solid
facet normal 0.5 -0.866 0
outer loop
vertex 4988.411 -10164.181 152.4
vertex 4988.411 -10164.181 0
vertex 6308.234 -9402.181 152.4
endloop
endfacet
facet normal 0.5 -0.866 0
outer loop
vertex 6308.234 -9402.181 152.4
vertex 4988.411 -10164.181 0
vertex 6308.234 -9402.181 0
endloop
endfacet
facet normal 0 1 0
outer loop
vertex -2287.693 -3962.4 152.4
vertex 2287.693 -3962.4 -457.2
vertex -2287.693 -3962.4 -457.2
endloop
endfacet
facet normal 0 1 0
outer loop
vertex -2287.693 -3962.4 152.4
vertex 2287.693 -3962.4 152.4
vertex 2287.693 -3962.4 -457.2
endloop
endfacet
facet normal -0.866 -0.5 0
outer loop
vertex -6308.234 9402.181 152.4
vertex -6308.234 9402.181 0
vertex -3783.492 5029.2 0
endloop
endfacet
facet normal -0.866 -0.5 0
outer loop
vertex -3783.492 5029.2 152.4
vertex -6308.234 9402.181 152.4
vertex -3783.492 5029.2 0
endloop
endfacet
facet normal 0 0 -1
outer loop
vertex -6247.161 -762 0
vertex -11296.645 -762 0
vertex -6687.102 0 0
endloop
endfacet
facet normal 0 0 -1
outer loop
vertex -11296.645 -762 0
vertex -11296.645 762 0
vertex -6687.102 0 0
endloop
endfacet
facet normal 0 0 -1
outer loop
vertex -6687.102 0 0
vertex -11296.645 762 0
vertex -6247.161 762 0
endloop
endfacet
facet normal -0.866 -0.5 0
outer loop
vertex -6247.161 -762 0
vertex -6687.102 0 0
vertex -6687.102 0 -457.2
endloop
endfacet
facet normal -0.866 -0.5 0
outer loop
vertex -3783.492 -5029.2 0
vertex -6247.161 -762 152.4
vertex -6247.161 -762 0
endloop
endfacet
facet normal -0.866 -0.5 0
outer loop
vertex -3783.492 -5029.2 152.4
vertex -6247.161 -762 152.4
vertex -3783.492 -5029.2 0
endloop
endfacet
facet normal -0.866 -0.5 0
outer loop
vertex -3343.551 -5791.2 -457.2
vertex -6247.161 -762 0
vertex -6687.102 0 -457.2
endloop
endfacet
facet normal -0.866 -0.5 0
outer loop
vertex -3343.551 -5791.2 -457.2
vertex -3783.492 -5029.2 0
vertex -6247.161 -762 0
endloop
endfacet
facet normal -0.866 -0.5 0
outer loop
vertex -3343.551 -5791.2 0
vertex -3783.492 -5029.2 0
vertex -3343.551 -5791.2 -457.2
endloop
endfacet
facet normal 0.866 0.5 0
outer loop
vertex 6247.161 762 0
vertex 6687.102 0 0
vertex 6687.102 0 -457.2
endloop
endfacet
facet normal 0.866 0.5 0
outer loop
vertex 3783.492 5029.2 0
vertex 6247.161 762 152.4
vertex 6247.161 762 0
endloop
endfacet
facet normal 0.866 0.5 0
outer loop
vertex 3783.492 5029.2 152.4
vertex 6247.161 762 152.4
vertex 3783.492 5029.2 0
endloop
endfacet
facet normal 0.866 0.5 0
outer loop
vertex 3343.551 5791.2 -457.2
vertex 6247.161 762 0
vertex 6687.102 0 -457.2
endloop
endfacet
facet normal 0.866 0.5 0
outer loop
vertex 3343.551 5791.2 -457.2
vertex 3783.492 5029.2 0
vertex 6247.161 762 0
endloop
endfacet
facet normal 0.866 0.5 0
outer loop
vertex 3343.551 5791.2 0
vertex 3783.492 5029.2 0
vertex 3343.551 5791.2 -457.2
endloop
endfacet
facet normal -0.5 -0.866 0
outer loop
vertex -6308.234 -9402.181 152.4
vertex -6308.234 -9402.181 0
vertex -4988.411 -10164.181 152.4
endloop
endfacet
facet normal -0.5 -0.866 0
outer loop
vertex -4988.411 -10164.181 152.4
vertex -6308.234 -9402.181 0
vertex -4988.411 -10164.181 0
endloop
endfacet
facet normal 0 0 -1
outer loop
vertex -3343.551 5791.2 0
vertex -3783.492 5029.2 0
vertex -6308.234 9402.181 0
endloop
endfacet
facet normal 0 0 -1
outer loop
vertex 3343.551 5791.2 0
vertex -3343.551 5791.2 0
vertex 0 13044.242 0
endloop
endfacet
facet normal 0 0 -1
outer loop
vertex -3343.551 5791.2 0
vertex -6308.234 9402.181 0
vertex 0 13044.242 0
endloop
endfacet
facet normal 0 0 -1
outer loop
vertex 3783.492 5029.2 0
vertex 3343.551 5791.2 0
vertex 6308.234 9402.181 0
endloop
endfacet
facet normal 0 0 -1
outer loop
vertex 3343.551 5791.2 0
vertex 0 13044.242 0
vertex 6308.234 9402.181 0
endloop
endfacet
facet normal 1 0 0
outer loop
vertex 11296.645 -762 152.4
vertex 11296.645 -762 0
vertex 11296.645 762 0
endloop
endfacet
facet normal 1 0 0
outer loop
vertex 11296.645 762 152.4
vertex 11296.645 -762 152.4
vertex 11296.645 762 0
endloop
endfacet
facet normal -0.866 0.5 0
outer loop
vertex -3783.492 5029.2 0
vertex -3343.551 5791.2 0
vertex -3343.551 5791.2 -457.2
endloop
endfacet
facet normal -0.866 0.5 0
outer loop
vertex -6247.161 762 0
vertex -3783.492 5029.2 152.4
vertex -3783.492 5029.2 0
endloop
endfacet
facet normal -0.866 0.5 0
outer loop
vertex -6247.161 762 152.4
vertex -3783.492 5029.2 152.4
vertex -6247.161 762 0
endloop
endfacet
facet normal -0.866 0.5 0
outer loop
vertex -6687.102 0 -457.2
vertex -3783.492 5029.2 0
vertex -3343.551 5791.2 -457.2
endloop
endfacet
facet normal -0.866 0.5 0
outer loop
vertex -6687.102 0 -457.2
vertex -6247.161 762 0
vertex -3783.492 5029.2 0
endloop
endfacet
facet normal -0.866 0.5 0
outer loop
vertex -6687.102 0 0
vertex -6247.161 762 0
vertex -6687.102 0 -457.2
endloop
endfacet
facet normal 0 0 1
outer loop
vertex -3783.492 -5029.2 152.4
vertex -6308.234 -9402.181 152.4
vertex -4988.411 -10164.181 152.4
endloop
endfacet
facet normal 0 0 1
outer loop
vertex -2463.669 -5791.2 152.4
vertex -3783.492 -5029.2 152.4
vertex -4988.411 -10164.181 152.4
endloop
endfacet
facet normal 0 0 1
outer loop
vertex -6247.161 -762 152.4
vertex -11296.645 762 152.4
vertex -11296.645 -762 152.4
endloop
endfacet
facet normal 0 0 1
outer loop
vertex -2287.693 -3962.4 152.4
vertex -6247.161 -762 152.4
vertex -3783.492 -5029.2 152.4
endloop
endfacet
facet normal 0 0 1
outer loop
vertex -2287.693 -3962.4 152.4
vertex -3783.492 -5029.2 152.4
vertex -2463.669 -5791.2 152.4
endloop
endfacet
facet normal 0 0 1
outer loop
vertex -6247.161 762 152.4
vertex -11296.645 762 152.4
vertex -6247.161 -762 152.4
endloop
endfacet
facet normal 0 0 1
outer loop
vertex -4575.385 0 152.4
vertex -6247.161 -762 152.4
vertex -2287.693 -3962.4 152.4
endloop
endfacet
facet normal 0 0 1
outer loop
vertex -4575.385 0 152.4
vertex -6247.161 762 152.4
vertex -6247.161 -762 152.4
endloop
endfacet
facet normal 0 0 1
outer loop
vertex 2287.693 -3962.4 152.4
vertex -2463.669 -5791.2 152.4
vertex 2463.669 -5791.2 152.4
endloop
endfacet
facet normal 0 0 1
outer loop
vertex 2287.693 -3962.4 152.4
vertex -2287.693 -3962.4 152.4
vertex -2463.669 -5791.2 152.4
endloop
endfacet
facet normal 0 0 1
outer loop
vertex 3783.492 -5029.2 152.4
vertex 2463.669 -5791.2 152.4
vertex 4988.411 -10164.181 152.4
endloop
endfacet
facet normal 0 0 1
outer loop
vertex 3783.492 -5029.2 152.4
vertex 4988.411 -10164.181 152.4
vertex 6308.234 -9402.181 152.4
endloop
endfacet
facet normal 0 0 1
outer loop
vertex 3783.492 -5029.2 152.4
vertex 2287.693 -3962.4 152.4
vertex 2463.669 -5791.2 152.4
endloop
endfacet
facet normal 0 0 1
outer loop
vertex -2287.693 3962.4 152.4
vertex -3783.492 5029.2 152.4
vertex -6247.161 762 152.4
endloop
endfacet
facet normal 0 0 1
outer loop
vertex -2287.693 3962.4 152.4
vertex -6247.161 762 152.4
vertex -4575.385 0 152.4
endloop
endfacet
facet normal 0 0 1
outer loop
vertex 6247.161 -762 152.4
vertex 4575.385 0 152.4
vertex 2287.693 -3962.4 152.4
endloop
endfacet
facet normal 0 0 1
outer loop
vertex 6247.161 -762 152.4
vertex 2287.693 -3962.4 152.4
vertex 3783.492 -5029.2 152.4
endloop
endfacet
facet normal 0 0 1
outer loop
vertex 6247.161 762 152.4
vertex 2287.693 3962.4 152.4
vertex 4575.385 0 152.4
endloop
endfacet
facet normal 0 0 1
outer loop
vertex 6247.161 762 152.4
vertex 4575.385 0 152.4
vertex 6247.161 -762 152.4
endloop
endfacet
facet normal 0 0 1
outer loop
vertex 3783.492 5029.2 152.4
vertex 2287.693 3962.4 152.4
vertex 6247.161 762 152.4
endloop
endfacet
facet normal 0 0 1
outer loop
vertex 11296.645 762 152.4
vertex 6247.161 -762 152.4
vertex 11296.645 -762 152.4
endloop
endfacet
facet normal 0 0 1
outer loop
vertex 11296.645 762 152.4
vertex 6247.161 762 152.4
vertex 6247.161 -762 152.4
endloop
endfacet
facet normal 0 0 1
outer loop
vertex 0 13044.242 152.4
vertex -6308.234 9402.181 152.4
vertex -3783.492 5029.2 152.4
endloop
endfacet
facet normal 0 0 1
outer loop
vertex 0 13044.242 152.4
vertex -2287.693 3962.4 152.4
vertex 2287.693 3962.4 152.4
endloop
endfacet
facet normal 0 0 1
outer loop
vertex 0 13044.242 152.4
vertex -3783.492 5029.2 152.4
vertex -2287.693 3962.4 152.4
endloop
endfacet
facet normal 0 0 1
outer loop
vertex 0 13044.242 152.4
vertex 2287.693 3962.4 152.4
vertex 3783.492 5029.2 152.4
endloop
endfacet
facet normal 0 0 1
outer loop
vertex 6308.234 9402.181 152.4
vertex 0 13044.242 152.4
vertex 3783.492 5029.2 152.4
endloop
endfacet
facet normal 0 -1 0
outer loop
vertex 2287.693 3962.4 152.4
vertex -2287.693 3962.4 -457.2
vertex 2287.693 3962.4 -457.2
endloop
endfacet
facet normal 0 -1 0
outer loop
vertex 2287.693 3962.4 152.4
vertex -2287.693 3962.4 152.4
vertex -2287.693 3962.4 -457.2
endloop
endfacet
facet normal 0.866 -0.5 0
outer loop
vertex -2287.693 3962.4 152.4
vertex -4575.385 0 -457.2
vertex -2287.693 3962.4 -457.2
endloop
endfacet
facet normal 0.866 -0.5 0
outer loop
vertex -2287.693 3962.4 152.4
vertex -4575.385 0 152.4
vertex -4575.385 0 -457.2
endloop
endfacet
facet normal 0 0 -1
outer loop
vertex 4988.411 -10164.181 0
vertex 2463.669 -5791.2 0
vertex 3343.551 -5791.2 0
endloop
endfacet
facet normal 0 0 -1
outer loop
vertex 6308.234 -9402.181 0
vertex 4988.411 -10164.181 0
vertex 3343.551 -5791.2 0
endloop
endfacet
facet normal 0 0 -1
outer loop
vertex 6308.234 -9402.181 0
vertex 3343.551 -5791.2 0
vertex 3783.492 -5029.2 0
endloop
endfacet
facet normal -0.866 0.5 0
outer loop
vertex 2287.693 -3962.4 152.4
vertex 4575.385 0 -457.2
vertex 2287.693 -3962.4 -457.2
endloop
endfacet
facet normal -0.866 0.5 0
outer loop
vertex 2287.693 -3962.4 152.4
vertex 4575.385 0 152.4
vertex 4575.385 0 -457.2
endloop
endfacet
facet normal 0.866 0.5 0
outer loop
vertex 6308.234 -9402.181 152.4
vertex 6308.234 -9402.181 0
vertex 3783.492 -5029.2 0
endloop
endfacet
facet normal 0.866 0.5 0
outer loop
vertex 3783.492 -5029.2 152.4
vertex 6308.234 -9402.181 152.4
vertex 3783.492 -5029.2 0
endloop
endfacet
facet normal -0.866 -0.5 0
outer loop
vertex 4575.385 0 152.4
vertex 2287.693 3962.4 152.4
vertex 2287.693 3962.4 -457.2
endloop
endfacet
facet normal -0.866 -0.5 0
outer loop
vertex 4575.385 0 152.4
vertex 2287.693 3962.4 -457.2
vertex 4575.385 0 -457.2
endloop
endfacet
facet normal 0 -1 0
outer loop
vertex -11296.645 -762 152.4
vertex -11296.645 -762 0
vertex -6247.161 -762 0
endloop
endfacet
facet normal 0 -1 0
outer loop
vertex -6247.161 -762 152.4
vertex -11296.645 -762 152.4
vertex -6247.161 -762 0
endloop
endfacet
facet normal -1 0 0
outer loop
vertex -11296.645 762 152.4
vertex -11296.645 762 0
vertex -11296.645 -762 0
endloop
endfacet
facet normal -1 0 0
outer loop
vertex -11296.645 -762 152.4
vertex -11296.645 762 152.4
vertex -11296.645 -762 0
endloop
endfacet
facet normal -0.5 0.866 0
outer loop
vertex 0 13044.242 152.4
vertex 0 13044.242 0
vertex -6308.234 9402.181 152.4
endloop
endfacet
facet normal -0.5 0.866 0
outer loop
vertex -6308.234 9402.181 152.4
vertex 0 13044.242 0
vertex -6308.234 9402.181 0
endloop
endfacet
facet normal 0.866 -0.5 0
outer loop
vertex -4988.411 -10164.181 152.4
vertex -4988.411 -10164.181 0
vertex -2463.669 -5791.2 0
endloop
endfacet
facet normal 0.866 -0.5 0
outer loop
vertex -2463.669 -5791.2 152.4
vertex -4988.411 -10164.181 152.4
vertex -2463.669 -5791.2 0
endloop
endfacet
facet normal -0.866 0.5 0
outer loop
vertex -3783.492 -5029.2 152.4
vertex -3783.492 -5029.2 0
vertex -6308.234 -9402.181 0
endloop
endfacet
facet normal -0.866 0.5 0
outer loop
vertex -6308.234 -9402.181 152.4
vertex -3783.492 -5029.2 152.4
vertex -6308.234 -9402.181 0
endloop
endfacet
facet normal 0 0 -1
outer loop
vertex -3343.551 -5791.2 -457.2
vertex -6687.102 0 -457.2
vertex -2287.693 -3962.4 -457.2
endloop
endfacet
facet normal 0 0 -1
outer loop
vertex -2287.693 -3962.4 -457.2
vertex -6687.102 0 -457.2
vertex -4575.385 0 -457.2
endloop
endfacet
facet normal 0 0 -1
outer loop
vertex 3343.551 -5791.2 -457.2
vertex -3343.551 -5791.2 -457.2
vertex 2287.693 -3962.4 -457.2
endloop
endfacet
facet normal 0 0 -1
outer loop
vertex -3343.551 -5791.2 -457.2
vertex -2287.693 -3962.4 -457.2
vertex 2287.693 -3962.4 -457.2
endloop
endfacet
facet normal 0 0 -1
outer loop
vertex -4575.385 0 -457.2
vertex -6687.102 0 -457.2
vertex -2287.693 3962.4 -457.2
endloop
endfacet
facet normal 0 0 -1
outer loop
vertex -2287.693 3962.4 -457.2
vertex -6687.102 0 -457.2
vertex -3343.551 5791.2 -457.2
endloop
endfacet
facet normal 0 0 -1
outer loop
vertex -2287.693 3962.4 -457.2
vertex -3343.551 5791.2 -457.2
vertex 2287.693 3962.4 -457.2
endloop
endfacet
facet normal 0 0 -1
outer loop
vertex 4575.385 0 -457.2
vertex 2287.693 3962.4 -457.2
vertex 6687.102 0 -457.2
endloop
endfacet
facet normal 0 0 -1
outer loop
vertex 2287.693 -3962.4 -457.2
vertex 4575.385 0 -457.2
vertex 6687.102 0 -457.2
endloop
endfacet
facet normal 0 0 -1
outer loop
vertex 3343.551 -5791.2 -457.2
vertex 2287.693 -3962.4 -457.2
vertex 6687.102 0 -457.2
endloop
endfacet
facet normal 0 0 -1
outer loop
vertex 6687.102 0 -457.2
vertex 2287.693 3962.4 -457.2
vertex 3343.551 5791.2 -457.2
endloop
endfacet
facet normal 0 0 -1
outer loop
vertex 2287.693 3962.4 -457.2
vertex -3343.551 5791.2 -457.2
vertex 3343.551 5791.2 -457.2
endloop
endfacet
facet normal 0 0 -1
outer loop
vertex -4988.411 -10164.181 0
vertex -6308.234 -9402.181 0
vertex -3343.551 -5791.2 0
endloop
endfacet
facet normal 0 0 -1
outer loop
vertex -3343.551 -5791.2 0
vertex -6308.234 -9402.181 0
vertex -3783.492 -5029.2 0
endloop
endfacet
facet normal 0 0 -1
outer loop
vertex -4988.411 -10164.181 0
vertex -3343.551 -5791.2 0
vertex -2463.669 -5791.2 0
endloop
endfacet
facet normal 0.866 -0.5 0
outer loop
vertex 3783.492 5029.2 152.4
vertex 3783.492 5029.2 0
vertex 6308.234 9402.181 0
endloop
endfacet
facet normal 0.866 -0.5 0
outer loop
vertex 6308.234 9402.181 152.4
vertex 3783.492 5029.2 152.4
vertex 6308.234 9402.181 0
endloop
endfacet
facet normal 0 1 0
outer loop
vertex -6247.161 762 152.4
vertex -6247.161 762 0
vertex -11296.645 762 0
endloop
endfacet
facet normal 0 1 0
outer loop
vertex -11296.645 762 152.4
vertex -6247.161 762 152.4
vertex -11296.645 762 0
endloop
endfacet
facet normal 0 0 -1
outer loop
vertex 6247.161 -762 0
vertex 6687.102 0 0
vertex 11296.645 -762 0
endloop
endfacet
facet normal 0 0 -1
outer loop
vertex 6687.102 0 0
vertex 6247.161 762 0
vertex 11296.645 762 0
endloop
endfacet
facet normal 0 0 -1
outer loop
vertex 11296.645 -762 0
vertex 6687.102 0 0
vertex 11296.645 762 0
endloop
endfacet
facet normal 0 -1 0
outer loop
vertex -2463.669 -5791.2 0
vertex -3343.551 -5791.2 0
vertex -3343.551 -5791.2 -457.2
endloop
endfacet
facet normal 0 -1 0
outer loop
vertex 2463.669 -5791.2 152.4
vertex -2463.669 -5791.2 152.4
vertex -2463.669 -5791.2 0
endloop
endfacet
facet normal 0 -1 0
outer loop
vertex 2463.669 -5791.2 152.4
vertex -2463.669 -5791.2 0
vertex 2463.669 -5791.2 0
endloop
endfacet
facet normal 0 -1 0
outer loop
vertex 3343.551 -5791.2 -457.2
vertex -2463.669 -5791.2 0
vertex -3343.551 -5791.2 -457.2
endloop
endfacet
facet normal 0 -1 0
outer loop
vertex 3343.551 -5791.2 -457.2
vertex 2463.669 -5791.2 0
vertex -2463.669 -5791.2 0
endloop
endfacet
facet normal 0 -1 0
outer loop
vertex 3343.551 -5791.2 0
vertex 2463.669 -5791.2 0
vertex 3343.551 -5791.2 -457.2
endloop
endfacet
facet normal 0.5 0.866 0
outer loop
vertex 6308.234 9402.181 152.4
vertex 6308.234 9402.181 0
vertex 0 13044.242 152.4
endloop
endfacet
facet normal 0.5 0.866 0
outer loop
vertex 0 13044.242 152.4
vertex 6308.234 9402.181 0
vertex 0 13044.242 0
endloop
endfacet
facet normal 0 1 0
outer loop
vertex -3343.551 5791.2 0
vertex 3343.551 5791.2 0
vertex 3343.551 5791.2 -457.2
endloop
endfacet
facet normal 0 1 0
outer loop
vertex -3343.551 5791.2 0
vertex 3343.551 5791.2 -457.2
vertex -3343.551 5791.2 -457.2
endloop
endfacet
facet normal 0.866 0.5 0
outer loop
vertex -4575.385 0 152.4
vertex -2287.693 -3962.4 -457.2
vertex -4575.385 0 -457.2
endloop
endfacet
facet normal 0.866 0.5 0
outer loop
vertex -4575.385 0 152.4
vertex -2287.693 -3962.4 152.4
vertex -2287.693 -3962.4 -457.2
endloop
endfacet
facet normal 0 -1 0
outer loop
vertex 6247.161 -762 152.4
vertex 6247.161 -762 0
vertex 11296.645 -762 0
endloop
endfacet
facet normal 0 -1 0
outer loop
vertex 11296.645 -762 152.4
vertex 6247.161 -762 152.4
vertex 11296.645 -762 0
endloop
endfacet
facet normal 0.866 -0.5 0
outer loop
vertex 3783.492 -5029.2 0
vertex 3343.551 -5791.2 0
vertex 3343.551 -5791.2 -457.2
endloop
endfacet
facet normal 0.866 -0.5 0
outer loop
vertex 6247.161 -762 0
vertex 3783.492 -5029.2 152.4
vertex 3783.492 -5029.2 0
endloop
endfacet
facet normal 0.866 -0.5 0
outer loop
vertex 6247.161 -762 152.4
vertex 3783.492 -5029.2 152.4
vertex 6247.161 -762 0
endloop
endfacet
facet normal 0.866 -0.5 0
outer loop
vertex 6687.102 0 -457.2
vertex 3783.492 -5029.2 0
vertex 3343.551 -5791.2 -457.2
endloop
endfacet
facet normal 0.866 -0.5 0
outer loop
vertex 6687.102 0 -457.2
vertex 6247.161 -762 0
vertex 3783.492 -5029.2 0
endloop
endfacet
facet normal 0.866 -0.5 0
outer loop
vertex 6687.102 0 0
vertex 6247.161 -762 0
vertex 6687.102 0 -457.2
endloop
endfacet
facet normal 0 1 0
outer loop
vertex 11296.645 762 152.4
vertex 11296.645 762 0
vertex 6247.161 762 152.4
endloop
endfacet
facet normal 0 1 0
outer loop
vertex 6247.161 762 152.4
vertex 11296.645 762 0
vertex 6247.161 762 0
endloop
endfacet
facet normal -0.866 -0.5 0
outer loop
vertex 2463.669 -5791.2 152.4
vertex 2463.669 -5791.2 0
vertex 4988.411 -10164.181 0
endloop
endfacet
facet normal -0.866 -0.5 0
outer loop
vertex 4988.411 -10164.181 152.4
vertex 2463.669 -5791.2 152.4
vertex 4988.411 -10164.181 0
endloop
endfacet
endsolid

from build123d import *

# Parameters (mm, degrees)
F1_DEPTH = 152.4
F2_DEPTH = 457.2


# Not quite as in the source:
# - the program builds the solid bodies; features that only make, move or delete a surface that nothing else refers to are left out


with BuildPart() as f1:
    # F0 (on Top) → F1 (new body)
    with BuildSketch(Plane.XY):
        Polygon((6247.1608527394, 762), (6687.1017578619, 0), (6247.1608527394, -762), (11296.6448630235, -762), (11296.6448630235, 762), align=None)
        Polygon((6247.1608527394, -762), (6687.1017578619, 0), (6247.1608527394, 762), (3783.4917840535, 5029.2), (3343.550878931, 5791.2), (2463.669068686, 5791.2), (-2463.669068686, 5791.2), (-3343.550878931, 5791.2), (-3783.4917840535, 5029.2), (-6247.1608527394, 762), (-6687.1017578619, 0), (-6247.1608527394, -762), (-3783.4917840535, -5029.2), (-3343.550878931, -5791.2), (-2463.669068686, -5791.2), (2463.669068686, -5791.2), (3343.550878931, -5791.2), (3783.4917840535, -5029.2), align=None)
        Polygon((2287.692706637, 3962.4), (4575.3854132739, 0), (2287.692706637, -3962.4), (-2287.692706637, -3962.4), (-4575.3854132739, 0), (-2287.692706637, 3962.4), align=None, mode=Mode.SUBTRACT)
        Polygon((6308.2337891955, -9402.1814289093), (3783.4917840535, -5029.2), (3343.550878931, -5791.2), (2463.669068686, -5791.2), (4988.411073828, -10164.1814289093), align=None)
        Polygon((3343.550878931, 5791.2), (3783.4917840535, 5029.2), (6308.2337891955, 9402.1814289093), (4988.411073828, 10164.1814289093), (2463.669068686, 5791.2), align=None)
        Polygon((-2463.669068686, 5791.2), (2463.669068686, 5791.2), (4988.411073828, 10164.1814289093), (0, 13044.2419052124), (-4988.411073828, 10164.1814289093), align=None)
        Polygon((-4988.411073828, -10164.1814289093), (-2463.669068686, -5791.2), (-3343.550878931, -5791.2), (-3783.4917840535, -5029.2), (-6308.2337891955, -9402.1814289093), align=None)
        Polygon((-3343.550878931, 5791.2), (-2463.669068686, 5791.2), (-4988.411073828, 10164.1814289093), (-6308.2337891955, 9402.1814289093), (-3783.4917840535, 5029.2), align=None)
        Polygon((-11296.6448630235, -762), (-6247.1608527394, -762), (-6687.1017578619, 0), (-6247.1608527394, 762), (-11296.6448630235, 762), align=None)
    extrude(amount=F1_DEPTH)

    # F0 (on Top) → F2 (join)
    with BuildSketch(Plane.XY):
        Polygon((6247.1608527394, -762), (6687.1017578619, 0), (6247.1608527394, 762), (3783.4917840535, 5029.2), (3343.550878931, 5791.2), (2463.669068686, 5791.2), (-2463.669068686, 5791.2), (-3343.550878931, 5791.2), (-3783.4917840535, 5029.2), (-6247.1608527394, 762), (-6687.1017578619, 0), (-6247.1608527394, -762), (-3783.4917840535, -5029.2), (-3343.550878931, -5791.2), (-2463.669068686, -5791.2), (2463.669068686, -5791.2), (3343.550878931, -5791.2), (3783.4917840535, -5029.2), align=None)
        Polygon((2287.692706637, 3962.4), (4575.3854132739, 0), (2287.692706637, -3962.4), (-2287.692706637, -3962.4), (-4575.3854132739, 0), (-2287.692706637, 3962.4), align=None, mode=Mode.SUBTRACT)
    extrude(amount=-F2_DEPTH)


solid = f1.part
